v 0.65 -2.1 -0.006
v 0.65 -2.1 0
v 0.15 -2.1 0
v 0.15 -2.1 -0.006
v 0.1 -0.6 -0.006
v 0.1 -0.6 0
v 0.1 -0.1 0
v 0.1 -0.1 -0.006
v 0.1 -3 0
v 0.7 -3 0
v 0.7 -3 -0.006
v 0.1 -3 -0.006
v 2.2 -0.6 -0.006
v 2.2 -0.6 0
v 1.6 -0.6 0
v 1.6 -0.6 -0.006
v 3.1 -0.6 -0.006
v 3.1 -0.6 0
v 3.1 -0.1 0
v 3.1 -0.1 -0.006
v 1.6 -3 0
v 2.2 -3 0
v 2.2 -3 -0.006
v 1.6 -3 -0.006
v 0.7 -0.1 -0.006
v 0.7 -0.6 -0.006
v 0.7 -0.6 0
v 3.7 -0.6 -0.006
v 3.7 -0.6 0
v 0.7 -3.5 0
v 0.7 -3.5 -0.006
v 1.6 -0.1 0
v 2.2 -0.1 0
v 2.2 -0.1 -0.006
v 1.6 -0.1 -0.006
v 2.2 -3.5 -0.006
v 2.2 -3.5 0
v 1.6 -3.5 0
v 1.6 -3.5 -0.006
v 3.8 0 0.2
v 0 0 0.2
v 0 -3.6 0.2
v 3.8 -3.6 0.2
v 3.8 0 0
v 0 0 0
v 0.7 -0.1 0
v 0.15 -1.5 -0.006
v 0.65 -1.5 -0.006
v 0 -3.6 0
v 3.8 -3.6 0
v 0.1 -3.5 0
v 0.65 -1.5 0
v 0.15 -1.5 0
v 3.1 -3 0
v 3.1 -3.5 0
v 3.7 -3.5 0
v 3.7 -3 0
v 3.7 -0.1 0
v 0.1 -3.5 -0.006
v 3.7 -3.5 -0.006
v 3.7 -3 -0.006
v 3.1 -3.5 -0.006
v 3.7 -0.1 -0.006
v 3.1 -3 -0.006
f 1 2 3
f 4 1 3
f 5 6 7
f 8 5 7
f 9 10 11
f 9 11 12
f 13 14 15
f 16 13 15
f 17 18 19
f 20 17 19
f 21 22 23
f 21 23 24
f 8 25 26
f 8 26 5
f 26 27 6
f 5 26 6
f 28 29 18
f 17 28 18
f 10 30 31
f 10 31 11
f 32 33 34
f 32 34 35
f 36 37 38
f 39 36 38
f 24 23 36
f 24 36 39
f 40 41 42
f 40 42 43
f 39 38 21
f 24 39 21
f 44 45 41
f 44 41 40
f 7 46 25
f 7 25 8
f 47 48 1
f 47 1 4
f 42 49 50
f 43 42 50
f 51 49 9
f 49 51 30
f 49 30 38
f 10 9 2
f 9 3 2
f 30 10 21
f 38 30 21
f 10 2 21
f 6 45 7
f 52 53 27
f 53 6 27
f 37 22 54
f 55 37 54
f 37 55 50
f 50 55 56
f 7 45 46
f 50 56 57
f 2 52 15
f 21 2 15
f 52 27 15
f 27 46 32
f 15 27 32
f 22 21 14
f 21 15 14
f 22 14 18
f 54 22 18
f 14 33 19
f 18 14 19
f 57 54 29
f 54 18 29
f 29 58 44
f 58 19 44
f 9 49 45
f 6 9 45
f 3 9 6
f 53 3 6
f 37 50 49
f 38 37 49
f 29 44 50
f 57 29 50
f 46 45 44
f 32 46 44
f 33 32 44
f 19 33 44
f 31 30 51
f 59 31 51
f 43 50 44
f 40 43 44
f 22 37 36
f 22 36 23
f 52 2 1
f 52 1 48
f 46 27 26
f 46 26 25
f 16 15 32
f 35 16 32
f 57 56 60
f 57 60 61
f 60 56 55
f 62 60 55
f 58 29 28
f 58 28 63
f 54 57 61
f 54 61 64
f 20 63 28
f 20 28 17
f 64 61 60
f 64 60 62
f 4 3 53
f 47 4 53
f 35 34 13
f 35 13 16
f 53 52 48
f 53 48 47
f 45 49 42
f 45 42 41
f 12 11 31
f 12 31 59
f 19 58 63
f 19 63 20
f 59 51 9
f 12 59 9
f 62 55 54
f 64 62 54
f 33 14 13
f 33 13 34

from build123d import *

# Parameters (mm, degrees)
SKETCH_1_W      = 3.8
SKETCH_1_H      = 3.6
EXTRUDE_1_DEPTH = 0.2
SKETCH_2_W      = 0.5
SKETCH_2_H      = 0.6
SKETCH_2_W_2    = 0.6
SKETCH_2_H_2    = 0.5
EXTRUDE_2_DEPTH = 0.006


with BuildPart() as part:
    # Эскиз1 → Бобышка-Вытянуть1 (new body)
    with BuildSketch(Plane.XY):
        with Locations((1.9, -1.8)):
            Rectangle(SKETCH_1_W, SKETCH_1_H)
    extrude(amount=EXTRUDE_1_DEPTH)

    # Эскиз2 → Бобышка-Вытянуть2 (add)
    with BuildSketch(Plane(origin=(0, 0, 0), x_dir=(-1, 0, 0), z_dir=(0, 0, -1))):
        with Locations((-0.4, -1.8)):
            Rectangle(SKETCH_2_W, SKETCH_2_H)
        with Locations((-1.9, -3.25)):
            Rectangle(SKETCH_2_W_2, SKETCH_2_H_2)
        with Locations((-3.4, -3.25)):
            Rectangle(SKETCH_2_W_2, SKETCH_2_H_2)
        with Locations((-3.4, -0.35)):
            Rectangle(SKETCH_2_W_2, SKETCH_2_H_2)
        with Locations((-1.9, -0.35)):
            Rectangle(SKETCH_2_W_2, SKETCH_2_H_2)
        with Locations((-0.4, -3.25)):
            Rectangle(SKETCH_2_W_2, SKETCH_2_H_2)
        with Locations((-0.4, -0.35)):
            Rectangle(SKETCH_2_W_2, SKETCH_2_H_2)
    extrude(amount=EXTRUDE_2_DEPTH)


solid = part.part
